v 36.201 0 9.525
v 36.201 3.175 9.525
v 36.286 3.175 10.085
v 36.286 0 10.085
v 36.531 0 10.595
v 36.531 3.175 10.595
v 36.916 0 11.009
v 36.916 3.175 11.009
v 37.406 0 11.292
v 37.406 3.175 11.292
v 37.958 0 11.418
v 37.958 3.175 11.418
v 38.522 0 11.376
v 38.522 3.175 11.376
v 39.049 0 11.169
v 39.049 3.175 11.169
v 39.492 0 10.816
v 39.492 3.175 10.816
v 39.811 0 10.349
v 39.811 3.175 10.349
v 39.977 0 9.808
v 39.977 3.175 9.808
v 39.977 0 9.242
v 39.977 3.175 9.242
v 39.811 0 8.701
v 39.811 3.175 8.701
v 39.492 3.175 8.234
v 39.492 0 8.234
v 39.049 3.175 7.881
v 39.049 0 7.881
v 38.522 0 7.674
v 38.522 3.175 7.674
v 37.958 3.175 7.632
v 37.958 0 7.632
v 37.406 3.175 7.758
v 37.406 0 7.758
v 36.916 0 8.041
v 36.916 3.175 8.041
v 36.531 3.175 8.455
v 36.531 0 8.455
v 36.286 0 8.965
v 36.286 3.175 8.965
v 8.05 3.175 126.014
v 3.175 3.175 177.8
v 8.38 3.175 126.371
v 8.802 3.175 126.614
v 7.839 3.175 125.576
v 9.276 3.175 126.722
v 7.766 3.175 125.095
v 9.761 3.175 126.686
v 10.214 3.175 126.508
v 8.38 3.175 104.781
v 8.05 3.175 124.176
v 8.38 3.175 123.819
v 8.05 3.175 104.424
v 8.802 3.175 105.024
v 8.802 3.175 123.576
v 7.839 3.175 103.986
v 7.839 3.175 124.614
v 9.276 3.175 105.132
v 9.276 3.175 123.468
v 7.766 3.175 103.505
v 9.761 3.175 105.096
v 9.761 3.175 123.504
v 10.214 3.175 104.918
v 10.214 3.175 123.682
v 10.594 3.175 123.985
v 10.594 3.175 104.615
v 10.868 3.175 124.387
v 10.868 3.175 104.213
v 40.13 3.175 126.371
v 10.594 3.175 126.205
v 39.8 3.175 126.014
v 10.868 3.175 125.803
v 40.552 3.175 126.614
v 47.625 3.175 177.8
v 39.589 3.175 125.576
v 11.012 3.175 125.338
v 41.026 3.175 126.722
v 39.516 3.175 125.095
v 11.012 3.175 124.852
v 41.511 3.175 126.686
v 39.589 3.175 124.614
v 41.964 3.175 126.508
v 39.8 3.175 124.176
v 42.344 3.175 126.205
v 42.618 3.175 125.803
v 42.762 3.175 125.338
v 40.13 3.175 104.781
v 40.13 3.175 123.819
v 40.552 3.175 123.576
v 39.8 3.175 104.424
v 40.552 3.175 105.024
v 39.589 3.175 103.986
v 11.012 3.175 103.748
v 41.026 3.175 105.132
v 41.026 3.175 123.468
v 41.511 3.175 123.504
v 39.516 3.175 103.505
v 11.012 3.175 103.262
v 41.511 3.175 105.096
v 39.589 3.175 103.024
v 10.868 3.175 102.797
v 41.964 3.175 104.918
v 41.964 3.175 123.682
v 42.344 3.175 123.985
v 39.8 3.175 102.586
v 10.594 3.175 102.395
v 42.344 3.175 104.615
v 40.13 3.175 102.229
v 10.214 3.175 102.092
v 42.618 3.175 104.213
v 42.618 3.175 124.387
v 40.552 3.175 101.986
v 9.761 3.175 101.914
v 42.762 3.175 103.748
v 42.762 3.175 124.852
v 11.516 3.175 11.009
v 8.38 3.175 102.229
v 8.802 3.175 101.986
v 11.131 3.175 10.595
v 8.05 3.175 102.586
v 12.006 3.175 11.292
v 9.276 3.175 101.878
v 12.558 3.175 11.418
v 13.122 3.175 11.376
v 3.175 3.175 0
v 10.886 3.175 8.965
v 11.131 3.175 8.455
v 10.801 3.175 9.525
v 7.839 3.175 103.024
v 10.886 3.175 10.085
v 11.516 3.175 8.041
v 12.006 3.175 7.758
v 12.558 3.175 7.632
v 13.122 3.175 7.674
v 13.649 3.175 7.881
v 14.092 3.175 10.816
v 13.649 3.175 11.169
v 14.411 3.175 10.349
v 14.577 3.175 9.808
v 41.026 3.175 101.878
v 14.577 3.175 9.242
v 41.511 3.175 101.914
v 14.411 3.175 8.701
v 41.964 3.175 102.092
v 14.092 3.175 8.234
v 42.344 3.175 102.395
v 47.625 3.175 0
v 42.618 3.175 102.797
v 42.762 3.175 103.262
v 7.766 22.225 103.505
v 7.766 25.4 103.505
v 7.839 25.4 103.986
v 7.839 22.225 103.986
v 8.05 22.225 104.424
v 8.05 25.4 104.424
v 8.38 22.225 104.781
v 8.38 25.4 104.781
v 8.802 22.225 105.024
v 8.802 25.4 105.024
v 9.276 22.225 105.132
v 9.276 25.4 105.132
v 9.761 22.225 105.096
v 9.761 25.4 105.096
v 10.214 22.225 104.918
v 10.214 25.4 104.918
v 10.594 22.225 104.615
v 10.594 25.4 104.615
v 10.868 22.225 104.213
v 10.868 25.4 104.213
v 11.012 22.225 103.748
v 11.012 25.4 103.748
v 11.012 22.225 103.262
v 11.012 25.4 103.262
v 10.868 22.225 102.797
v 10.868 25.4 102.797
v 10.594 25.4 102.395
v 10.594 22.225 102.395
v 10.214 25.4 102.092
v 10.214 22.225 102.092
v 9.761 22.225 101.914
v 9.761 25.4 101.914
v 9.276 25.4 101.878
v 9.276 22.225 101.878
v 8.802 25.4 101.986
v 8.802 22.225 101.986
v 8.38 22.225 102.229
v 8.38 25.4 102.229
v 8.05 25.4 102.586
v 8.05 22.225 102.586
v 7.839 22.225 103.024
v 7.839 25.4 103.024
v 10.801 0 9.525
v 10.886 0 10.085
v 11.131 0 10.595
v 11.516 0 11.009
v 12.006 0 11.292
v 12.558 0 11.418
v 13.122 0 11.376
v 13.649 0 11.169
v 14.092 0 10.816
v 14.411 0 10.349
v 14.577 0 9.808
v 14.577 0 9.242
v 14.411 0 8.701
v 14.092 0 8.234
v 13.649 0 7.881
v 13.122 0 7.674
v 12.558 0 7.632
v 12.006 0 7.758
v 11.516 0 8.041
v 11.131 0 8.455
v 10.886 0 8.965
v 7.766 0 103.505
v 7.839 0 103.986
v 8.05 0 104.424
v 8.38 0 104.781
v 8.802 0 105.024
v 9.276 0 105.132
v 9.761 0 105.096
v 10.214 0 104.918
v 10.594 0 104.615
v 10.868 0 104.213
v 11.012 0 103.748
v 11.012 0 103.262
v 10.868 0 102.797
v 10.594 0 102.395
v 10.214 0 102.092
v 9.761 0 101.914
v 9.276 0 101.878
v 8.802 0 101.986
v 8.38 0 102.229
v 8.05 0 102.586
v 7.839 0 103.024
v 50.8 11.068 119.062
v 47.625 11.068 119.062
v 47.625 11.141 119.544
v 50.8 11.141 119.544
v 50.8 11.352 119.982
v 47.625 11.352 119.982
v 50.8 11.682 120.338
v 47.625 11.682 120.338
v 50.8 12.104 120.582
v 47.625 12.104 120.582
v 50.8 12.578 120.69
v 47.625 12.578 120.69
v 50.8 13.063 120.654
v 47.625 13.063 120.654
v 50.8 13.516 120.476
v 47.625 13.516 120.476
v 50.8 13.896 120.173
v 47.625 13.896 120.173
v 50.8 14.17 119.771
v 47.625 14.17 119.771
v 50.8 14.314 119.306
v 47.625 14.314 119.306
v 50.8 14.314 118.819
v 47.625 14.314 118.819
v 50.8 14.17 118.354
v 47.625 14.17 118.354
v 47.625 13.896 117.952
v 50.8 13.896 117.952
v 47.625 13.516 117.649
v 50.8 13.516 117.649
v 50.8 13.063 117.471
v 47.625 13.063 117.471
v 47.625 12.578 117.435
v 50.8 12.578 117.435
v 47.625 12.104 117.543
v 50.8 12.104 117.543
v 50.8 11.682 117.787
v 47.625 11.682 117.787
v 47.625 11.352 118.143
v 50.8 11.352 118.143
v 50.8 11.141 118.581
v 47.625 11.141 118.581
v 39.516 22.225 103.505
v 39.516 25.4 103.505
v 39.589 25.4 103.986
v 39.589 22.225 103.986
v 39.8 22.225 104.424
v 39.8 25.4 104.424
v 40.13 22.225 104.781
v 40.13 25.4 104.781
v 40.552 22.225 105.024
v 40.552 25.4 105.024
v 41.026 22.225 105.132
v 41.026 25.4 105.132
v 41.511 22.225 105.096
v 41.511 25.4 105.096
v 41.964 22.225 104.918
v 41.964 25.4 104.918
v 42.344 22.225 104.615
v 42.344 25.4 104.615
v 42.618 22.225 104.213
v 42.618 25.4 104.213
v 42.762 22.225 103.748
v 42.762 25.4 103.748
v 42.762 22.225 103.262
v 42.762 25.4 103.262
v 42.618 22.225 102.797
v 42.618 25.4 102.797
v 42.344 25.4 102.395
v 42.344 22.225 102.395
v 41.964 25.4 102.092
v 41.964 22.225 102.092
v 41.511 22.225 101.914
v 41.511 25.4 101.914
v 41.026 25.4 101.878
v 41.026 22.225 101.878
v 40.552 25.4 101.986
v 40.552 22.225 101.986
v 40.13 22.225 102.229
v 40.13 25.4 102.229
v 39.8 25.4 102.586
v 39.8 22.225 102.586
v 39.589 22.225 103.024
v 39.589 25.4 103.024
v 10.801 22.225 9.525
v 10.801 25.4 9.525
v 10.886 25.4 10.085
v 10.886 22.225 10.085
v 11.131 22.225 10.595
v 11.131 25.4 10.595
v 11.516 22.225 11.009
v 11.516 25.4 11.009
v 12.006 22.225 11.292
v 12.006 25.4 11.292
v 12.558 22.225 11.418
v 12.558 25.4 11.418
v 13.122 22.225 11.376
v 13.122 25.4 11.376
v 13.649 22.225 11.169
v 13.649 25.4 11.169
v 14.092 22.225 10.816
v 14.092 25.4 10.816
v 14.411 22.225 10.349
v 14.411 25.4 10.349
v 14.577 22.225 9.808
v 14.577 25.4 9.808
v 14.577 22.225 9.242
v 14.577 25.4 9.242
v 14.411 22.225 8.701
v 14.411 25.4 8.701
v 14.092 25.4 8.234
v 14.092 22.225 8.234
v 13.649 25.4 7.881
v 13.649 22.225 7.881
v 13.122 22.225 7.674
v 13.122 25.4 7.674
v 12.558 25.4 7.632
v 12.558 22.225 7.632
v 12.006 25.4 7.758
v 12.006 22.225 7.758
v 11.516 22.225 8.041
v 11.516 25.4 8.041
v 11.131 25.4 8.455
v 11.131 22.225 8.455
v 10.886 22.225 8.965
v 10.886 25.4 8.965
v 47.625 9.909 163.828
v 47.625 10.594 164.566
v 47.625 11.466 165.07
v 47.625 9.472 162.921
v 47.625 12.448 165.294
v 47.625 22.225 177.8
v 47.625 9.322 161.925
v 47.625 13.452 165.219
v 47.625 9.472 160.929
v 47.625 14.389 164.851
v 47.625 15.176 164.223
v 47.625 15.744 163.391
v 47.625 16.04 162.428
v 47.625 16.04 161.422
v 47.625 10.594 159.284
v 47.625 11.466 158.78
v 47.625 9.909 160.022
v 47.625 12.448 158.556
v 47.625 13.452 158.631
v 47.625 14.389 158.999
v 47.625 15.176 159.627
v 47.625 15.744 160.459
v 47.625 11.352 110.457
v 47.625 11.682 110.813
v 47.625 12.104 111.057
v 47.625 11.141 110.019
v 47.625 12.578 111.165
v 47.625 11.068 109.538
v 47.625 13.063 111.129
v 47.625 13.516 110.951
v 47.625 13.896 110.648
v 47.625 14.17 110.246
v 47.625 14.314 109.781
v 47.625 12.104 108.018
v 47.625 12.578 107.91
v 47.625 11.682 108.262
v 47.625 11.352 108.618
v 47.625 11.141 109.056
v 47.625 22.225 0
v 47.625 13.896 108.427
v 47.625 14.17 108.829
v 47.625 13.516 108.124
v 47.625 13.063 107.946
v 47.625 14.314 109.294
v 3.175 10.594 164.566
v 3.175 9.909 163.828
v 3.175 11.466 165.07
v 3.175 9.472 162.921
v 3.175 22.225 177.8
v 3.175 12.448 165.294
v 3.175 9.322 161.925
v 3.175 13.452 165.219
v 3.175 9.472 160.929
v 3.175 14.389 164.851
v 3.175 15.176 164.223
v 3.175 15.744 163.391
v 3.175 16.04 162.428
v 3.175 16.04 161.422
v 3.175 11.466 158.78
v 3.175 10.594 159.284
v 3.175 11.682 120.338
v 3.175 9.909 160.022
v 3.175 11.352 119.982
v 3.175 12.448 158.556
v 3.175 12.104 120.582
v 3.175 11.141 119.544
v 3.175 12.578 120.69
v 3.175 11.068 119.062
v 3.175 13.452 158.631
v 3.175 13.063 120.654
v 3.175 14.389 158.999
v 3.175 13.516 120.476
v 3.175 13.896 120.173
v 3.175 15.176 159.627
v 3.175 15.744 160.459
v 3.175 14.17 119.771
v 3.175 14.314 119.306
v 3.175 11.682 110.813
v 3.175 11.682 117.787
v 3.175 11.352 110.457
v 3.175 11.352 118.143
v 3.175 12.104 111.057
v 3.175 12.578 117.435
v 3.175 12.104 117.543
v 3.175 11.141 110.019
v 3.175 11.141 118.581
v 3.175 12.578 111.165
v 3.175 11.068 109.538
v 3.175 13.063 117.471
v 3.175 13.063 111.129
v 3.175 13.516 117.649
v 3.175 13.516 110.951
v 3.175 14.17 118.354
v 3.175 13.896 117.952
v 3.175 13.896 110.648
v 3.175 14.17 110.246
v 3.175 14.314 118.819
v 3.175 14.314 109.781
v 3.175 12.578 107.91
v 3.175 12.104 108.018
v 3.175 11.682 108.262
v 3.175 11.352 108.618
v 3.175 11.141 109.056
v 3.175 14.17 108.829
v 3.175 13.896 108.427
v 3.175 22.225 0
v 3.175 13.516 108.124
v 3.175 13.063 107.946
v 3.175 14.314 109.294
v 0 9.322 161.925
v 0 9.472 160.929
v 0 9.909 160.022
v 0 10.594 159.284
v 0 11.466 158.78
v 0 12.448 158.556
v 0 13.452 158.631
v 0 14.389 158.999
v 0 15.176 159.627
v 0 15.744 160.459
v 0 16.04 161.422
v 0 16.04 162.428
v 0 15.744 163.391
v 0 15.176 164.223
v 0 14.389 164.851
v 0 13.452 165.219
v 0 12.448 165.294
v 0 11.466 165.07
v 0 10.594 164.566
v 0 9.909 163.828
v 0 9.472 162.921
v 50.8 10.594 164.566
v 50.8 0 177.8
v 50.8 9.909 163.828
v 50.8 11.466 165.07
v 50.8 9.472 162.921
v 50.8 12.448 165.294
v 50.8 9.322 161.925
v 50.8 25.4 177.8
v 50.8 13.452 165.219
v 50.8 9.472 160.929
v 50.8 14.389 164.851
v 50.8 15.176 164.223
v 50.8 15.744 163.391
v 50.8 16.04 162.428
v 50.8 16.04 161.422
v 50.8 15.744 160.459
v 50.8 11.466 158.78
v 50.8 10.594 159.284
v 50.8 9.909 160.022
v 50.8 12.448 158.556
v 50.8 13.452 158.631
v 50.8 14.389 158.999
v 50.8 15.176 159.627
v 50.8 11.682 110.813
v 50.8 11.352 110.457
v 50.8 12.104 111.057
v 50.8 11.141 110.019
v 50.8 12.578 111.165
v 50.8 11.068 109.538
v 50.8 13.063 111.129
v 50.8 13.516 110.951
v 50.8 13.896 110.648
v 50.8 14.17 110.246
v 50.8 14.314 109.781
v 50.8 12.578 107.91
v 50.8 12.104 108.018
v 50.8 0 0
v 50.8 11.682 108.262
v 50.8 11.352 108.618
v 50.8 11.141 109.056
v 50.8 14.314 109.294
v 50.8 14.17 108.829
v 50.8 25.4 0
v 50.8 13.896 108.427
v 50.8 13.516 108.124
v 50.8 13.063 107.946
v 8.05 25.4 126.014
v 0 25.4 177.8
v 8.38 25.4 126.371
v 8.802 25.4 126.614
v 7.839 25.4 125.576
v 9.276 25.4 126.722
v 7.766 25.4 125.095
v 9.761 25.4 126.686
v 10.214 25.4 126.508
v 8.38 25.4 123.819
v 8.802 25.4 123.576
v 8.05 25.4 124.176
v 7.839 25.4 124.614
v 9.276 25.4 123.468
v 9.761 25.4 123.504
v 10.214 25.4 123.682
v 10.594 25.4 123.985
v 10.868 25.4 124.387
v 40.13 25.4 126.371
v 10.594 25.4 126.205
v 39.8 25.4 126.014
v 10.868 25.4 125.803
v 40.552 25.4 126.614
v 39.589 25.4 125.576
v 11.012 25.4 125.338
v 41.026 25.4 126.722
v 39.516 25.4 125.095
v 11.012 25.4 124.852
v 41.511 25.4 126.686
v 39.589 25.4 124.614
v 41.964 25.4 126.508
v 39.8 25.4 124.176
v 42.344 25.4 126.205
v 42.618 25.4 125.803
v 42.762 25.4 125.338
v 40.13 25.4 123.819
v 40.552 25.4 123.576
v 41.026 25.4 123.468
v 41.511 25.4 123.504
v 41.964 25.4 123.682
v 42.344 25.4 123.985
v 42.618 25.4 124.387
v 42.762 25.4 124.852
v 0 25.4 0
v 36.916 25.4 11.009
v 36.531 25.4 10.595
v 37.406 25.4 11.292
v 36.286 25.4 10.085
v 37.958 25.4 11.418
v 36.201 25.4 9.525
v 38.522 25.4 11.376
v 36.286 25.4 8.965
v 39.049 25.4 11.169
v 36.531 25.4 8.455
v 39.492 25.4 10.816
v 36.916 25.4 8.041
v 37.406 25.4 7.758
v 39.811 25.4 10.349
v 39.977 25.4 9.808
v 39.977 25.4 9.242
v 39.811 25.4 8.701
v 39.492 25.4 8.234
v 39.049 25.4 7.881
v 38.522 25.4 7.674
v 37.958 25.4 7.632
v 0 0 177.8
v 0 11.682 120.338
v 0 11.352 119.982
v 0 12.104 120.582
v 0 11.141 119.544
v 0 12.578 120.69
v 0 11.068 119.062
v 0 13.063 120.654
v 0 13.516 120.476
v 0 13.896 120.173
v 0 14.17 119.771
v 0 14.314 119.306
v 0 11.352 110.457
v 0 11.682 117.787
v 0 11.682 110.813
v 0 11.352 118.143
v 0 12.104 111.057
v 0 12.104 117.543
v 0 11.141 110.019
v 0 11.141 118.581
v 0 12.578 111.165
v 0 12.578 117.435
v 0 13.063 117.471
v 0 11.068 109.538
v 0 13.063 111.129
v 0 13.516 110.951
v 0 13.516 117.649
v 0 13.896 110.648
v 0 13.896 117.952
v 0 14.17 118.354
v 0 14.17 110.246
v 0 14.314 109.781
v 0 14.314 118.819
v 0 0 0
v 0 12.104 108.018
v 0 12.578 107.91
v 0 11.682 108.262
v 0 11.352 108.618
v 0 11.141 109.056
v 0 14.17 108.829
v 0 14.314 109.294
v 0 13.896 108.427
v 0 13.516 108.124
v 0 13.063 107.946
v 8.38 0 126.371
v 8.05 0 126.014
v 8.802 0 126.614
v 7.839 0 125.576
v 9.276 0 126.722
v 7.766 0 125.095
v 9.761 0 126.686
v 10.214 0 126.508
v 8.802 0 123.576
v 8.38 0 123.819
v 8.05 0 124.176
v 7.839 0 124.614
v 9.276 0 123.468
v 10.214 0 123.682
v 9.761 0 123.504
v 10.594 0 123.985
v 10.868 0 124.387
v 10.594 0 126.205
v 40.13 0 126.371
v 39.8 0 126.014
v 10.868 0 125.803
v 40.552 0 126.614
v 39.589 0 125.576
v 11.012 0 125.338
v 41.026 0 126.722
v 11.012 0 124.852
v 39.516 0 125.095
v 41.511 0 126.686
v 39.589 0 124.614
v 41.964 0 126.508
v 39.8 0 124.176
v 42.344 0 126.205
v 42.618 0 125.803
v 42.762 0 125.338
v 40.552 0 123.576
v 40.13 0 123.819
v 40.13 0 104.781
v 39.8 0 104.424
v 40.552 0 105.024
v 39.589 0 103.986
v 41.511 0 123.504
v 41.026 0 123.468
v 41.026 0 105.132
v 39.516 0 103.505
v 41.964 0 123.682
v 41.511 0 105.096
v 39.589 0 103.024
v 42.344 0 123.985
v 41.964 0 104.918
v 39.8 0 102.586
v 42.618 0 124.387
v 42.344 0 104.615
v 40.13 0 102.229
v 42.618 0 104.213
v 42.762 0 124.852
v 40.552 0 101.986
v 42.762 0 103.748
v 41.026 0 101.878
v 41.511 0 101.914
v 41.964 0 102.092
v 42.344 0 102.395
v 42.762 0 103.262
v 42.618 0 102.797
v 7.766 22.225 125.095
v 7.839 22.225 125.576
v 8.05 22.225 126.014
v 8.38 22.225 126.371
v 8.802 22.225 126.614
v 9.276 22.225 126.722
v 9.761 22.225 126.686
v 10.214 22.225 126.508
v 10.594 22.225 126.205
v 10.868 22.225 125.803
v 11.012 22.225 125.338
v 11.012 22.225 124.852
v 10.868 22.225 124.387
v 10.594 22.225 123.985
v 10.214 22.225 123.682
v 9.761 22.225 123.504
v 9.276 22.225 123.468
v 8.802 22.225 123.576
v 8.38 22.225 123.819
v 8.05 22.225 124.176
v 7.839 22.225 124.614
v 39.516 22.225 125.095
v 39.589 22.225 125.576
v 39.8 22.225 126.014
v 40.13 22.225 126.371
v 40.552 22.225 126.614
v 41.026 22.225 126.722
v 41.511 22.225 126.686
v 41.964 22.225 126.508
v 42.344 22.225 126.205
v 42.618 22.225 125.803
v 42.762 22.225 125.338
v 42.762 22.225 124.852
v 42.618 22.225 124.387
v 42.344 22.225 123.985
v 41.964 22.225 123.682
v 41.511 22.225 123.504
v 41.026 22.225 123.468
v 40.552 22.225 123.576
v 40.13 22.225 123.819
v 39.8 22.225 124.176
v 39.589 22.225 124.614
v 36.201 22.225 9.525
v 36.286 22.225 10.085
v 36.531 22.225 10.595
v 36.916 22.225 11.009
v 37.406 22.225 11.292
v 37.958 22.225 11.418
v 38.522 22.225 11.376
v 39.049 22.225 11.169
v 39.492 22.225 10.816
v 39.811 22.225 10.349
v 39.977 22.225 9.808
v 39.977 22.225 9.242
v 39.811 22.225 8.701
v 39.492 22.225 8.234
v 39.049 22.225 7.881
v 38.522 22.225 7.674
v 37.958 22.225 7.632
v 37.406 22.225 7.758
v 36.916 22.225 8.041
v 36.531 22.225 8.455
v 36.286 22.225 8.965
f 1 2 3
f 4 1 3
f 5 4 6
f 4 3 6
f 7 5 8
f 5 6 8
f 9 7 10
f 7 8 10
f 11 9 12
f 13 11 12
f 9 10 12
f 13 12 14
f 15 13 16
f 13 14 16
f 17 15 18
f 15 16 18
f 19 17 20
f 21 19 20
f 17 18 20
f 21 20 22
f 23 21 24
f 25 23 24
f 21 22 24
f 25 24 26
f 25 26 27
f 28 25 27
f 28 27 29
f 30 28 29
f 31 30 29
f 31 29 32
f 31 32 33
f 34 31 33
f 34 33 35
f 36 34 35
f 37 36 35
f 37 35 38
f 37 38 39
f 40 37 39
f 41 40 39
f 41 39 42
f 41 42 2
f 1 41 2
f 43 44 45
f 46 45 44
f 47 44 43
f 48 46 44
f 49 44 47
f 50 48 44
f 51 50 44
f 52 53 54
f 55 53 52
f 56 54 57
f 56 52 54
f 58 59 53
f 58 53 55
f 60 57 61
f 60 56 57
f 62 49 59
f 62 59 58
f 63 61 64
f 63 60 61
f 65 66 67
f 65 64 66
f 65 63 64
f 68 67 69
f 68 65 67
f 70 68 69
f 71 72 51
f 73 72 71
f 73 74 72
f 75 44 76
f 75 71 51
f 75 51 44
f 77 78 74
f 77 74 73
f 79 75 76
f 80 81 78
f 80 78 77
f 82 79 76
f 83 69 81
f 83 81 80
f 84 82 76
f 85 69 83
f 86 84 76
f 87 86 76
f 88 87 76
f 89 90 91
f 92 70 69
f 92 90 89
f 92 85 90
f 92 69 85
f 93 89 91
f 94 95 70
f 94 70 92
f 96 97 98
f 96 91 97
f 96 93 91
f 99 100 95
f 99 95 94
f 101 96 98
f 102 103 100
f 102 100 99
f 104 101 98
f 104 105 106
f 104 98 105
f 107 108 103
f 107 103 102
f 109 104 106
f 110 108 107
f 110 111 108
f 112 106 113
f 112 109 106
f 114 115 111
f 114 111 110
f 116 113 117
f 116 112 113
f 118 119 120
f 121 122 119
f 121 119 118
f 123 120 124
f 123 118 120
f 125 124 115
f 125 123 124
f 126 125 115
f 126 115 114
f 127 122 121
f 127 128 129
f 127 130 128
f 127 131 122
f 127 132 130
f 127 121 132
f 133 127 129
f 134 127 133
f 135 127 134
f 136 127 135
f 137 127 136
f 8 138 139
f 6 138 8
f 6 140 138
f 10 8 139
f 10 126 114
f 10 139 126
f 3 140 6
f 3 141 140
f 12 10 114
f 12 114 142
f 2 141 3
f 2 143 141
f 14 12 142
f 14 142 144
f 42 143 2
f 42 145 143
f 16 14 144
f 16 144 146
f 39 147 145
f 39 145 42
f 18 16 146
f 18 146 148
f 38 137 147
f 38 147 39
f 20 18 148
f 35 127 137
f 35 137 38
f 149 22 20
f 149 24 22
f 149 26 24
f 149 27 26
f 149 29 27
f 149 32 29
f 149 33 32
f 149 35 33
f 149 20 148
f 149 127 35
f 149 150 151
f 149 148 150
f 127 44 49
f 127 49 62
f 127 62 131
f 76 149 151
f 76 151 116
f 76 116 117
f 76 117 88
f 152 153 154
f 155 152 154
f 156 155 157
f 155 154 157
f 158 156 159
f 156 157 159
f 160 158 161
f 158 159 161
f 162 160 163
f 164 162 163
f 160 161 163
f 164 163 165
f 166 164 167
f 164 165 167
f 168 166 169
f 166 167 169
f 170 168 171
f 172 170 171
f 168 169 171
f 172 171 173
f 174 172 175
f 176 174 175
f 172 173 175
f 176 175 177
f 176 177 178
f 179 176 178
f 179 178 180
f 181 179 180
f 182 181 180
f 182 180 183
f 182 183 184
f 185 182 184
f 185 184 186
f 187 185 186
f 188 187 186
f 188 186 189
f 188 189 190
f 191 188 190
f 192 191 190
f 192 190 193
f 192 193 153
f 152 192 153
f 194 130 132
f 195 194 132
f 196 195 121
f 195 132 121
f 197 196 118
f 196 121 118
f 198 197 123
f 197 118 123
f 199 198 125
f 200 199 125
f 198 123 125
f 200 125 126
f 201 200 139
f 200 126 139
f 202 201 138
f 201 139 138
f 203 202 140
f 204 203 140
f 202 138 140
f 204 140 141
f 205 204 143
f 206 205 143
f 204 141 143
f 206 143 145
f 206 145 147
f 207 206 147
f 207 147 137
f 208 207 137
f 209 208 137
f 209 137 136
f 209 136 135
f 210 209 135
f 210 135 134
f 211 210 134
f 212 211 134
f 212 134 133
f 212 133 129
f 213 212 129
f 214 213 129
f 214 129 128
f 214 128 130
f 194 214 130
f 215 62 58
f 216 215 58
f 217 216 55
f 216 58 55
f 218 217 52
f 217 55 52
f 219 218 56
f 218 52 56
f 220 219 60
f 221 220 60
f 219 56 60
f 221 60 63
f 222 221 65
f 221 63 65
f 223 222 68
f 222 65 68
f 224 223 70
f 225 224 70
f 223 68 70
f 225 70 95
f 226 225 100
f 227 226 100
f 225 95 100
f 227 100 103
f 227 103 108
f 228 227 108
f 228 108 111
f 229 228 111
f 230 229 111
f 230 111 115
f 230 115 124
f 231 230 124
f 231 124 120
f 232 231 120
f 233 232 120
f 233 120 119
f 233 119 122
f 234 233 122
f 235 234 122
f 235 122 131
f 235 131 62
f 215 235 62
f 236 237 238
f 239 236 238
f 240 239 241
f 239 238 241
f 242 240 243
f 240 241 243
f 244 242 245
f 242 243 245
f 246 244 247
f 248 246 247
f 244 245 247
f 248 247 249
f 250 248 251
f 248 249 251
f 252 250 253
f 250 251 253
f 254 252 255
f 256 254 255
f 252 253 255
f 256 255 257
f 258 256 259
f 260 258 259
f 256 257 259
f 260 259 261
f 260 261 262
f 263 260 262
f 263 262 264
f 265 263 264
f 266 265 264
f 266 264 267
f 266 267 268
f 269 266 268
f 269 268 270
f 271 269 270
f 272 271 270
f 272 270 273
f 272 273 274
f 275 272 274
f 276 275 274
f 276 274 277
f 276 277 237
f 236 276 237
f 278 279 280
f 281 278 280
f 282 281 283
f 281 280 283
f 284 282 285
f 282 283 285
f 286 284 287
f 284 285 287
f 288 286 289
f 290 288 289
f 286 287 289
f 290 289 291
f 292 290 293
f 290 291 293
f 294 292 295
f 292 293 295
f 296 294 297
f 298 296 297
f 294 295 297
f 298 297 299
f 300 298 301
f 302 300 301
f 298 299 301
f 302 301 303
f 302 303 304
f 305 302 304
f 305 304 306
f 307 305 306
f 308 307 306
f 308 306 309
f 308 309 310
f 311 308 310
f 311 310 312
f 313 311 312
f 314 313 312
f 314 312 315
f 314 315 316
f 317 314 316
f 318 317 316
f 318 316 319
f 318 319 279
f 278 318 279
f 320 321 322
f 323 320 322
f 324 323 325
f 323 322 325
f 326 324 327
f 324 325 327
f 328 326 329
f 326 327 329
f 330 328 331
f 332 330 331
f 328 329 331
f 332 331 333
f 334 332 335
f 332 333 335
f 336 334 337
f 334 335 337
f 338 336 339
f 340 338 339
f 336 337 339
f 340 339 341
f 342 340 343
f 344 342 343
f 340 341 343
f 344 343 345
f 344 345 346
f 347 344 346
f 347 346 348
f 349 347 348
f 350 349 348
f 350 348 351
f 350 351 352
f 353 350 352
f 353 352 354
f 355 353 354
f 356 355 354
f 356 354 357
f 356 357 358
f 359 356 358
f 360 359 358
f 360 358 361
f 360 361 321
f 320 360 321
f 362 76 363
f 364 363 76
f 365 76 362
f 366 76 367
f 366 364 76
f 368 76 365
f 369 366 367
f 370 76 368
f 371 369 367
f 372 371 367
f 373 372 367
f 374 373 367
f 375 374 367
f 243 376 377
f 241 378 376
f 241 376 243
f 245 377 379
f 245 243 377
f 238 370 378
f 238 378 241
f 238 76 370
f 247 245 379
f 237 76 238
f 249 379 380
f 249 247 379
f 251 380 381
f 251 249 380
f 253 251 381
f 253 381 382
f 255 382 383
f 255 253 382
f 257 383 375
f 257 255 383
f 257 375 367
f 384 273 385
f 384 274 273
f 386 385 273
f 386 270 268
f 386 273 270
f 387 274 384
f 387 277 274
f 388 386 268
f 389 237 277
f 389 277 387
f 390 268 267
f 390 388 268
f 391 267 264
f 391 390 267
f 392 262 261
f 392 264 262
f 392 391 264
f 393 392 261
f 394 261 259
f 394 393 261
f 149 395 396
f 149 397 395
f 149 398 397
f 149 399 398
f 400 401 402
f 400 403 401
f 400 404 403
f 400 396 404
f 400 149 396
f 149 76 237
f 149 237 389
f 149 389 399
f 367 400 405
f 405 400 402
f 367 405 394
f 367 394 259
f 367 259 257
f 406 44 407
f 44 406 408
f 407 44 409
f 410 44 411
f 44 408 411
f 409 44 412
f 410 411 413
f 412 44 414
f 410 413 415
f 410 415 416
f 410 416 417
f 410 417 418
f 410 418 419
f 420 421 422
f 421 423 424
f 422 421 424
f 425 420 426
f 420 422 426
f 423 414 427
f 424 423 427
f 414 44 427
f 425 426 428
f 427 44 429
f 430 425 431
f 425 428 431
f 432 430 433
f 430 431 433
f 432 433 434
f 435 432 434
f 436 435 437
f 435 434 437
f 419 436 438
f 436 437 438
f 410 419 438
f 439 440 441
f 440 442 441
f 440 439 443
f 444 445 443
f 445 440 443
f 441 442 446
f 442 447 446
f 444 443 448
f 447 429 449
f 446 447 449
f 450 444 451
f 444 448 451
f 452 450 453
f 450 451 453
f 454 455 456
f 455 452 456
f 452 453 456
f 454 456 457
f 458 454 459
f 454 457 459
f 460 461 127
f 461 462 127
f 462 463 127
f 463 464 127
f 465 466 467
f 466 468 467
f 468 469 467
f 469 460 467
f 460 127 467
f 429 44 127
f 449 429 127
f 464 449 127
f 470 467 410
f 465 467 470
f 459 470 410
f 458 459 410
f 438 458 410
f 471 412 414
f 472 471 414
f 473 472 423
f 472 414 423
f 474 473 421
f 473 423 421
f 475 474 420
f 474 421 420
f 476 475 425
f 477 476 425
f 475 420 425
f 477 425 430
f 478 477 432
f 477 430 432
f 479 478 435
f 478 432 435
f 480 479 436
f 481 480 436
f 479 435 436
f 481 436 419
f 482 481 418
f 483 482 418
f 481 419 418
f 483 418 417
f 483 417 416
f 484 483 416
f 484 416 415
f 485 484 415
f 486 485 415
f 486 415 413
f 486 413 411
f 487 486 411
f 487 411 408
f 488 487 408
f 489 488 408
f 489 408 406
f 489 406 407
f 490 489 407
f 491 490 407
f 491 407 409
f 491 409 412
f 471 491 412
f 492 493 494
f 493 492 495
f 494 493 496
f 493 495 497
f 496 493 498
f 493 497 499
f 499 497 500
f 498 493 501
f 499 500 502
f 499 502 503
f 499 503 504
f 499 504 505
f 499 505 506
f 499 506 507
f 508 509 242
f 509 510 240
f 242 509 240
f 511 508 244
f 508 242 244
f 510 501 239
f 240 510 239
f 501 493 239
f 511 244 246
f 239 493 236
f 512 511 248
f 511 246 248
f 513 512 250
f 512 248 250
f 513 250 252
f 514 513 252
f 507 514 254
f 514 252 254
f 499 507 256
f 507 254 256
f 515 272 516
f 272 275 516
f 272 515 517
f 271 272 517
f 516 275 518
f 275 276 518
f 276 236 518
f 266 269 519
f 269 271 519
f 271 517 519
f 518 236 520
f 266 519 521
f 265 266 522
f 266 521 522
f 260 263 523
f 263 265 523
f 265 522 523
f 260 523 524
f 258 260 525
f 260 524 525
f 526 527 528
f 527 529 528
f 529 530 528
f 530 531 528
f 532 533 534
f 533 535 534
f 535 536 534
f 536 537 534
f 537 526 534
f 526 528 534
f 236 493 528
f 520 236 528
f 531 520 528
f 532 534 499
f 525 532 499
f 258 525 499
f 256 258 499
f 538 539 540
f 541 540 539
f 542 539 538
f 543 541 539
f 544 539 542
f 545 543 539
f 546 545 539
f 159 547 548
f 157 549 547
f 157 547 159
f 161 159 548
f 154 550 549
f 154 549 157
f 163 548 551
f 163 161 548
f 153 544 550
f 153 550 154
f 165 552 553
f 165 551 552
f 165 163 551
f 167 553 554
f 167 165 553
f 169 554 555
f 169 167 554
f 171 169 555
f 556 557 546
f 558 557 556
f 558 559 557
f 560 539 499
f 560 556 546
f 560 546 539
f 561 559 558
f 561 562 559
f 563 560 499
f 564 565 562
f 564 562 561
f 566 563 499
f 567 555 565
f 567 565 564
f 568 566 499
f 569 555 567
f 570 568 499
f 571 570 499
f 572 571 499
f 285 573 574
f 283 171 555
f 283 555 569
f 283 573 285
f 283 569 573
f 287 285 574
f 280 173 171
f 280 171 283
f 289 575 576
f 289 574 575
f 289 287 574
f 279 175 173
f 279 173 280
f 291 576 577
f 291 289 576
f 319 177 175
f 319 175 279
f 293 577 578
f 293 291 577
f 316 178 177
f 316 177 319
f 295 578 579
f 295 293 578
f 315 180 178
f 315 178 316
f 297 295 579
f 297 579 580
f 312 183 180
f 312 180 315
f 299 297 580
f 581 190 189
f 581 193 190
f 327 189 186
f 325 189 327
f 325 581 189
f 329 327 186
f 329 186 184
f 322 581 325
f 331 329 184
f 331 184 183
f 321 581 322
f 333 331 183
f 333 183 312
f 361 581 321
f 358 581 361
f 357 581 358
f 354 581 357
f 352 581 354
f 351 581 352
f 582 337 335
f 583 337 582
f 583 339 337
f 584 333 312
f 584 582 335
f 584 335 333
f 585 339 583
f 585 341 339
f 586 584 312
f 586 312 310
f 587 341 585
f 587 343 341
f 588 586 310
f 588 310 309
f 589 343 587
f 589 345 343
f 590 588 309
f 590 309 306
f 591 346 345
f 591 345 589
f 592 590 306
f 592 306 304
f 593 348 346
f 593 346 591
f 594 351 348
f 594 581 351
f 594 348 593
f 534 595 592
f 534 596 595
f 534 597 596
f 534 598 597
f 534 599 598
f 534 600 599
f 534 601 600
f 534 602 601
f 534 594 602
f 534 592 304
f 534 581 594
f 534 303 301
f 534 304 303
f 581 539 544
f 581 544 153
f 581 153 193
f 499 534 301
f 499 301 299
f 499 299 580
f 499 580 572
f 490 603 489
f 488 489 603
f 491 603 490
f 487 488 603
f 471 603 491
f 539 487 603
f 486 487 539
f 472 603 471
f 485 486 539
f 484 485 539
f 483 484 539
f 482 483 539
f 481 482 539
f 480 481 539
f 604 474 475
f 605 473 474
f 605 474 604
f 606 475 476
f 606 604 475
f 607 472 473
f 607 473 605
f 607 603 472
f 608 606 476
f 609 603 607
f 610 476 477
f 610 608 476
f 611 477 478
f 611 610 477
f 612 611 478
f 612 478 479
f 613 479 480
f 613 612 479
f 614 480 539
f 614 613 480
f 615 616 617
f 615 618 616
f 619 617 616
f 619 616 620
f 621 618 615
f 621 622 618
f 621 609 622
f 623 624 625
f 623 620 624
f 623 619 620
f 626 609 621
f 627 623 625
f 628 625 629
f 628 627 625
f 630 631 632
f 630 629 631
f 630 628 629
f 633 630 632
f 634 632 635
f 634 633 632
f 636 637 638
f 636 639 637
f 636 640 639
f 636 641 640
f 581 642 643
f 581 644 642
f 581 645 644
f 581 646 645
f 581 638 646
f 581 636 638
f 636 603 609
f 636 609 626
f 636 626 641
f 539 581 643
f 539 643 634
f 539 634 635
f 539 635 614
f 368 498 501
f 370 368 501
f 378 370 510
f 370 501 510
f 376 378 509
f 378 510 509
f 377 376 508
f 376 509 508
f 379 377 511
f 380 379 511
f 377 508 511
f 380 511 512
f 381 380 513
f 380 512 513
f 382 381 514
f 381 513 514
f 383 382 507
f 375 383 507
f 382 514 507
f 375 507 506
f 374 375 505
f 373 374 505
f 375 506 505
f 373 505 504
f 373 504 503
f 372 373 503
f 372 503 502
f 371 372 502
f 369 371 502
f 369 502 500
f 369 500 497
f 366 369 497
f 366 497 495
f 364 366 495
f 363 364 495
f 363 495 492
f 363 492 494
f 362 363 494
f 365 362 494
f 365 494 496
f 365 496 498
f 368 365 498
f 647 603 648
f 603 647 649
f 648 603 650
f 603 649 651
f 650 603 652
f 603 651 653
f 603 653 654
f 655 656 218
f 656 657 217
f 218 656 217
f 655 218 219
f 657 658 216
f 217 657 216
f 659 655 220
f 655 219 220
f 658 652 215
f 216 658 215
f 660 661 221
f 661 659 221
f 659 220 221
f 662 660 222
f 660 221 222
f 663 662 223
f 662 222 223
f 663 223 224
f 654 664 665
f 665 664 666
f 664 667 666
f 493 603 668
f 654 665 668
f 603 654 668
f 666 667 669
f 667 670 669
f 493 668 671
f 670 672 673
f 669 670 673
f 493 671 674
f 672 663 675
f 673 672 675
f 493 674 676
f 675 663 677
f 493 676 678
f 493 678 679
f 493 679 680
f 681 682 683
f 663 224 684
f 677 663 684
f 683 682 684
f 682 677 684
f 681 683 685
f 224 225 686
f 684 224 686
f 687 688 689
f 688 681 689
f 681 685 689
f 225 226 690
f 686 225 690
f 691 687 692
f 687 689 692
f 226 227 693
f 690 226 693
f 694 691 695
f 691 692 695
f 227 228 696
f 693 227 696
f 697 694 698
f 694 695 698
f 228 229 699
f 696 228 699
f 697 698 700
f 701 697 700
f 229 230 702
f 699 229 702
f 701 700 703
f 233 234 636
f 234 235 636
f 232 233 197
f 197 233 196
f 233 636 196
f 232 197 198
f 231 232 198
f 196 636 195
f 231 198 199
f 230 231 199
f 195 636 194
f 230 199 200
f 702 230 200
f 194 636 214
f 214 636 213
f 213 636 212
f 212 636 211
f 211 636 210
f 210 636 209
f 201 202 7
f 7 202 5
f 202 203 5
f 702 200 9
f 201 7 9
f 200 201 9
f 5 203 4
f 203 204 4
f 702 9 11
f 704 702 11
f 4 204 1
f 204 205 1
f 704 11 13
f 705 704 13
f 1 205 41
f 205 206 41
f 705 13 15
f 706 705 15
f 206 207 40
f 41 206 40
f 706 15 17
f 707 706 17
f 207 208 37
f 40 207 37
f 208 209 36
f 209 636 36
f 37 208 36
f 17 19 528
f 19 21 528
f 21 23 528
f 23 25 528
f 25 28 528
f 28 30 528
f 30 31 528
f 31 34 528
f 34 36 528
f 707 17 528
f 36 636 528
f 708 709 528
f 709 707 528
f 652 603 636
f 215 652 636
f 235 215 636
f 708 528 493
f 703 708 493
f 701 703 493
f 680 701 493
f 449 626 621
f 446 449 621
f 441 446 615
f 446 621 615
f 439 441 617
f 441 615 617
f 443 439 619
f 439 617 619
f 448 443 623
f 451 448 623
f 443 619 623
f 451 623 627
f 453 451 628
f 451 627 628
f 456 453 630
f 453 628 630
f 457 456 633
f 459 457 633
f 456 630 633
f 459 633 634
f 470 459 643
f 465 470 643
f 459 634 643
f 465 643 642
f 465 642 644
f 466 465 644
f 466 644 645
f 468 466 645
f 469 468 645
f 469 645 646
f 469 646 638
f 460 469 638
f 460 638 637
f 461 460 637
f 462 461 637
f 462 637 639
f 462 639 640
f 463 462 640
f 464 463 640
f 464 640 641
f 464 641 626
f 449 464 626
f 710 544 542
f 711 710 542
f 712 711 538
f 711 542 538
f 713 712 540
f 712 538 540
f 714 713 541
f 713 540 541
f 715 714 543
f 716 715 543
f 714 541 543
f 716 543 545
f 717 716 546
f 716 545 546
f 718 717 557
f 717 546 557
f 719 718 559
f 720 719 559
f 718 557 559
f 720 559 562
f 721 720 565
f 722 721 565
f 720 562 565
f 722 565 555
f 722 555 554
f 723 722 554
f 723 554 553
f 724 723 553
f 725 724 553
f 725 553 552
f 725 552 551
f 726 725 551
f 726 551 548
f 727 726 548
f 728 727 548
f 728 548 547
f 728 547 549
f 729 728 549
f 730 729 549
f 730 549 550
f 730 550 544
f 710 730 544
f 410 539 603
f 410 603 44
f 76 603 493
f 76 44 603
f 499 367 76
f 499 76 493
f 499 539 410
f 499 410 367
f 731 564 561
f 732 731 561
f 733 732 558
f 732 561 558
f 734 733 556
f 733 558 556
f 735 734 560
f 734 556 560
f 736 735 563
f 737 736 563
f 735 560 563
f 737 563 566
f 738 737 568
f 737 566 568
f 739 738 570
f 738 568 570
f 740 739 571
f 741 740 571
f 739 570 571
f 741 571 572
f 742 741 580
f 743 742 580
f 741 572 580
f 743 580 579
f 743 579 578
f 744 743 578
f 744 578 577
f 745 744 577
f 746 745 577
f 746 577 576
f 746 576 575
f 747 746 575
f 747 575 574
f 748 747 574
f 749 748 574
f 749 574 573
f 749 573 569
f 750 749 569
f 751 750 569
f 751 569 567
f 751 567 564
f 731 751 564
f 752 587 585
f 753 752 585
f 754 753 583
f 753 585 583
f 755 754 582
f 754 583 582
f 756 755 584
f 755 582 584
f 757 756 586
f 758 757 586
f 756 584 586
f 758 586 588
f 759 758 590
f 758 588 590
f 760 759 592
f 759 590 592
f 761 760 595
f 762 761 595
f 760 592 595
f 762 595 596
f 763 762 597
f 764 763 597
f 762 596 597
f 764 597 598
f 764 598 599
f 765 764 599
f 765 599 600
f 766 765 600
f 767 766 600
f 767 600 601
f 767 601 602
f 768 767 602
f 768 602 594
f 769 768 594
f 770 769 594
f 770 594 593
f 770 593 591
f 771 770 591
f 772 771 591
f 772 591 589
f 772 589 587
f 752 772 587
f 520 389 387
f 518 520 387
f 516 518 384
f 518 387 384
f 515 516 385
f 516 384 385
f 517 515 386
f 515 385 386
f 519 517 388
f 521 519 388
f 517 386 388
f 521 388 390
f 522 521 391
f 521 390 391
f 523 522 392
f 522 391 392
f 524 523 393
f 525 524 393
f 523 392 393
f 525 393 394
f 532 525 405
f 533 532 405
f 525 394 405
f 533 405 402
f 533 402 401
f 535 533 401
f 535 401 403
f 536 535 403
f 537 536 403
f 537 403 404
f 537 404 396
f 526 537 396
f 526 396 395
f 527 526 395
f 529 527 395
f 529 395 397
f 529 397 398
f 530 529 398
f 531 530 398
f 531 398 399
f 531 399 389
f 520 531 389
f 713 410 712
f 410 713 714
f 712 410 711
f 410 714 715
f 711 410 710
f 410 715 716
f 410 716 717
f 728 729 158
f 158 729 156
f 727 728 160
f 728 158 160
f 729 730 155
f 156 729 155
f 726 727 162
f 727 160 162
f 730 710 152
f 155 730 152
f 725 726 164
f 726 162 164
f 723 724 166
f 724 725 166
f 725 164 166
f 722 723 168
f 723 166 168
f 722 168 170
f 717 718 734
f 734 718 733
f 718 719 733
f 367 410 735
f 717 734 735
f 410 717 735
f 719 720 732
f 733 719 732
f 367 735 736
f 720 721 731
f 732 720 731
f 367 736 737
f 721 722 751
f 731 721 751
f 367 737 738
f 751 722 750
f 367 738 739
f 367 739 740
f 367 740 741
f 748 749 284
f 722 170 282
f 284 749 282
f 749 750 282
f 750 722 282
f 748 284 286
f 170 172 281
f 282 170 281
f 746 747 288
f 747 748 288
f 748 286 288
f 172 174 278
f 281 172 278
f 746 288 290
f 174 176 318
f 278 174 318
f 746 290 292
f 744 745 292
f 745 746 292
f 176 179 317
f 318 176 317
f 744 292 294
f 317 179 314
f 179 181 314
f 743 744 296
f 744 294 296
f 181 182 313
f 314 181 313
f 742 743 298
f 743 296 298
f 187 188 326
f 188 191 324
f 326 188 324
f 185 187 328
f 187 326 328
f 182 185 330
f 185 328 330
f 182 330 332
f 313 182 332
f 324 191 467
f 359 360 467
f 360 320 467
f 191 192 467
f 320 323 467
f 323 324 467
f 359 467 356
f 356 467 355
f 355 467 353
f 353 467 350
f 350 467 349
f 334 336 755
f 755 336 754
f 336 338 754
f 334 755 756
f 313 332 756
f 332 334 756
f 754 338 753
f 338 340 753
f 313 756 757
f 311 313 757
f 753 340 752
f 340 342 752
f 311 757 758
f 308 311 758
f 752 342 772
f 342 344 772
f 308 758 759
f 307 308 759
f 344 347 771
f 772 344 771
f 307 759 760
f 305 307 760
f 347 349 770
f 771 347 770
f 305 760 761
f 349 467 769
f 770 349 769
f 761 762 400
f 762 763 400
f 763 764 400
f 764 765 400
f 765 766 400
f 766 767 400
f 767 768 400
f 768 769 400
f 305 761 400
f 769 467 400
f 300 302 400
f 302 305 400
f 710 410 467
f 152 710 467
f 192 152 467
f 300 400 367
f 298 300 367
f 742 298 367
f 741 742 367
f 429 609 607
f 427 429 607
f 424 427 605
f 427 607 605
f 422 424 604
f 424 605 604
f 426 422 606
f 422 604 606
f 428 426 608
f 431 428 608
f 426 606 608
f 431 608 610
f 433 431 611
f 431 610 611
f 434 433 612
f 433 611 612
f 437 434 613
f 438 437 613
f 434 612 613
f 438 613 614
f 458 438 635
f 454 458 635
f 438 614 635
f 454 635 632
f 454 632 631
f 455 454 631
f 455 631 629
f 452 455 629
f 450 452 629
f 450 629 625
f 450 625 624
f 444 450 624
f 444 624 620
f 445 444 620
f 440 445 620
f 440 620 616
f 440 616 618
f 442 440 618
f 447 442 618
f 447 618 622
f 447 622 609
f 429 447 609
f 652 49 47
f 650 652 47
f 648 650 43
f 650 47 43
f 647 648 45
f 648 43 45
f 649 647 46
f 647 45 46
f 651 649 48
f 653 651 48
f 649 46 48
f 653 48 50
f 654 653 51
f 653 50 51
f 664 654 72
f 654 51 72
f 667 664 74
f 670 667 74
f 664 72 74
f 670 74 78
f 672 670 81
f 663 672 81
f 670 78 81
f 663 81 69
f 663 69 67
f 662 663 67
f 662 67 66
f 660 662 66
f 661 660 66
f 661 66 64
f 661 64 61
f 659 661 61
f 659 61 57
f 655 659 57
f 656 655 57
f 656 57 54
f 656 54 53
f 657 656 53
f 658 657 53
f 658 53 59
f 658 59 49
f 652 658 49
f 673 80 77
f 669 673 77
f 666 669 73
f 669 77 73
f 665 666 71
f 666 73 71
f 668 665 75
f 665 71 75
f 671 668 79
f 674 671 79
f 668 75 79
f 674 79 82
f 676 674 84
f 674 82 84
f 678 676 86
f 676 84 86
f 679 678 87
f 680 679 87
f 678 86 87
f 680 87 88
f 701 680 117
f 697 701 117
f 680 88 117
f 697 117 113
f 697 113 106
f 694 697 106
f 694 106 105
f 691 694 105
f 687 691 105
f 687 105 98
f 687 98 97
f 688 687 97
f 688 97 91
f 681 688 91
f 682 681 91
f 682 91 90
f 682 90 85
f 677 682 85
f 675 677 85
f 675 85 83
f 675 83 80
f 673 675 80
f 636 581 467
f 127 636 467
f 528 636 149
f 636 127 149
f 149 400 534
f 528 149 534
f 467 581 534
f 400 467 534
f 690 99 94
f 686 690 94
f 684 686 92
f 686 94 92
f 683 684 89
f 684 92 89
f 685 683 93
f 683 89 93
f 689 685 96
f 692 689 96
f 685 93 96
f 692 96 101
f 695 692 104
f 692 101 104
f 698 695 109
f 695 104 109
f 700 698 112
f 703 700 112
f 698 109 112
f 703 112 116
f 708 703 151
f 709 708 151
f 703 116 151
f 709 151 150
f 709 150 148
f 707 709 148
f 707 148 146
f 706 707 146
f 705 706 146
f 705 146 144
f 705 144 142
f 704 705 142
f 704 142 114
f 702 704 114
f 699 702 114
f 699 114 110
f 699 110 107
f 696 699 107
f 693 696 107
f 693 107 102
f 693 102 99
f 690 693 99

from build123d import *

# Parameters (mm, degrees)
F0_W     = 50.8
F0_H     = 25.4
F0_W_2   = 44.45
F0_H_2   = 19.05
F1_DEPTH = 177.8
F3_D     = 6.7564
F5_D     = 3.7973
F7_D     = 3.2639
F9_D     = 3.2639


with BuildPart() as f1:
    # F0 (on Top) → F1 (new body)
    with BuildSketch(Plane.XY):
        with Locations((25.4, 12.7)):
            Rectangle(F0_W, F0_H)
        with Locations((25.4, 12.7)):
            Rectangle(F0_W_2, F0_H_2, mode=Mode.SUBTRACT)
    extrude(amount=F1_DEPTH)

    # F3 (through all)
    with Locations(Plane(origin=(0, 0, 0), x_dir=(0, 1, 0), z_dir=(-1, 0, 0))):
        with Locations((12.7, -161.925)):
            Hole(F3_D / 2)

    # F5 (through all)
    with Locations(Plane.XZ):
        with Locations((12.7, 9.525), (38.1, 9.525)):
            Hole(F5_D / 2)

    # F7 (through all)
    with Locations(Plane.XZ):
        with Locations((9.398, 125.095), (41.148, 125.095), (41.148, 103.505), (9.398, 103.505)):
            Hole(F7_D / 2)

    # F9 (through all)
    with Locations(Plane.YZ.offset(50.8)):
        with Locations((12.7, 119.0625), (12.7, 109.5375)):
            Hole(F9_D / 2)


solid = f1.part
